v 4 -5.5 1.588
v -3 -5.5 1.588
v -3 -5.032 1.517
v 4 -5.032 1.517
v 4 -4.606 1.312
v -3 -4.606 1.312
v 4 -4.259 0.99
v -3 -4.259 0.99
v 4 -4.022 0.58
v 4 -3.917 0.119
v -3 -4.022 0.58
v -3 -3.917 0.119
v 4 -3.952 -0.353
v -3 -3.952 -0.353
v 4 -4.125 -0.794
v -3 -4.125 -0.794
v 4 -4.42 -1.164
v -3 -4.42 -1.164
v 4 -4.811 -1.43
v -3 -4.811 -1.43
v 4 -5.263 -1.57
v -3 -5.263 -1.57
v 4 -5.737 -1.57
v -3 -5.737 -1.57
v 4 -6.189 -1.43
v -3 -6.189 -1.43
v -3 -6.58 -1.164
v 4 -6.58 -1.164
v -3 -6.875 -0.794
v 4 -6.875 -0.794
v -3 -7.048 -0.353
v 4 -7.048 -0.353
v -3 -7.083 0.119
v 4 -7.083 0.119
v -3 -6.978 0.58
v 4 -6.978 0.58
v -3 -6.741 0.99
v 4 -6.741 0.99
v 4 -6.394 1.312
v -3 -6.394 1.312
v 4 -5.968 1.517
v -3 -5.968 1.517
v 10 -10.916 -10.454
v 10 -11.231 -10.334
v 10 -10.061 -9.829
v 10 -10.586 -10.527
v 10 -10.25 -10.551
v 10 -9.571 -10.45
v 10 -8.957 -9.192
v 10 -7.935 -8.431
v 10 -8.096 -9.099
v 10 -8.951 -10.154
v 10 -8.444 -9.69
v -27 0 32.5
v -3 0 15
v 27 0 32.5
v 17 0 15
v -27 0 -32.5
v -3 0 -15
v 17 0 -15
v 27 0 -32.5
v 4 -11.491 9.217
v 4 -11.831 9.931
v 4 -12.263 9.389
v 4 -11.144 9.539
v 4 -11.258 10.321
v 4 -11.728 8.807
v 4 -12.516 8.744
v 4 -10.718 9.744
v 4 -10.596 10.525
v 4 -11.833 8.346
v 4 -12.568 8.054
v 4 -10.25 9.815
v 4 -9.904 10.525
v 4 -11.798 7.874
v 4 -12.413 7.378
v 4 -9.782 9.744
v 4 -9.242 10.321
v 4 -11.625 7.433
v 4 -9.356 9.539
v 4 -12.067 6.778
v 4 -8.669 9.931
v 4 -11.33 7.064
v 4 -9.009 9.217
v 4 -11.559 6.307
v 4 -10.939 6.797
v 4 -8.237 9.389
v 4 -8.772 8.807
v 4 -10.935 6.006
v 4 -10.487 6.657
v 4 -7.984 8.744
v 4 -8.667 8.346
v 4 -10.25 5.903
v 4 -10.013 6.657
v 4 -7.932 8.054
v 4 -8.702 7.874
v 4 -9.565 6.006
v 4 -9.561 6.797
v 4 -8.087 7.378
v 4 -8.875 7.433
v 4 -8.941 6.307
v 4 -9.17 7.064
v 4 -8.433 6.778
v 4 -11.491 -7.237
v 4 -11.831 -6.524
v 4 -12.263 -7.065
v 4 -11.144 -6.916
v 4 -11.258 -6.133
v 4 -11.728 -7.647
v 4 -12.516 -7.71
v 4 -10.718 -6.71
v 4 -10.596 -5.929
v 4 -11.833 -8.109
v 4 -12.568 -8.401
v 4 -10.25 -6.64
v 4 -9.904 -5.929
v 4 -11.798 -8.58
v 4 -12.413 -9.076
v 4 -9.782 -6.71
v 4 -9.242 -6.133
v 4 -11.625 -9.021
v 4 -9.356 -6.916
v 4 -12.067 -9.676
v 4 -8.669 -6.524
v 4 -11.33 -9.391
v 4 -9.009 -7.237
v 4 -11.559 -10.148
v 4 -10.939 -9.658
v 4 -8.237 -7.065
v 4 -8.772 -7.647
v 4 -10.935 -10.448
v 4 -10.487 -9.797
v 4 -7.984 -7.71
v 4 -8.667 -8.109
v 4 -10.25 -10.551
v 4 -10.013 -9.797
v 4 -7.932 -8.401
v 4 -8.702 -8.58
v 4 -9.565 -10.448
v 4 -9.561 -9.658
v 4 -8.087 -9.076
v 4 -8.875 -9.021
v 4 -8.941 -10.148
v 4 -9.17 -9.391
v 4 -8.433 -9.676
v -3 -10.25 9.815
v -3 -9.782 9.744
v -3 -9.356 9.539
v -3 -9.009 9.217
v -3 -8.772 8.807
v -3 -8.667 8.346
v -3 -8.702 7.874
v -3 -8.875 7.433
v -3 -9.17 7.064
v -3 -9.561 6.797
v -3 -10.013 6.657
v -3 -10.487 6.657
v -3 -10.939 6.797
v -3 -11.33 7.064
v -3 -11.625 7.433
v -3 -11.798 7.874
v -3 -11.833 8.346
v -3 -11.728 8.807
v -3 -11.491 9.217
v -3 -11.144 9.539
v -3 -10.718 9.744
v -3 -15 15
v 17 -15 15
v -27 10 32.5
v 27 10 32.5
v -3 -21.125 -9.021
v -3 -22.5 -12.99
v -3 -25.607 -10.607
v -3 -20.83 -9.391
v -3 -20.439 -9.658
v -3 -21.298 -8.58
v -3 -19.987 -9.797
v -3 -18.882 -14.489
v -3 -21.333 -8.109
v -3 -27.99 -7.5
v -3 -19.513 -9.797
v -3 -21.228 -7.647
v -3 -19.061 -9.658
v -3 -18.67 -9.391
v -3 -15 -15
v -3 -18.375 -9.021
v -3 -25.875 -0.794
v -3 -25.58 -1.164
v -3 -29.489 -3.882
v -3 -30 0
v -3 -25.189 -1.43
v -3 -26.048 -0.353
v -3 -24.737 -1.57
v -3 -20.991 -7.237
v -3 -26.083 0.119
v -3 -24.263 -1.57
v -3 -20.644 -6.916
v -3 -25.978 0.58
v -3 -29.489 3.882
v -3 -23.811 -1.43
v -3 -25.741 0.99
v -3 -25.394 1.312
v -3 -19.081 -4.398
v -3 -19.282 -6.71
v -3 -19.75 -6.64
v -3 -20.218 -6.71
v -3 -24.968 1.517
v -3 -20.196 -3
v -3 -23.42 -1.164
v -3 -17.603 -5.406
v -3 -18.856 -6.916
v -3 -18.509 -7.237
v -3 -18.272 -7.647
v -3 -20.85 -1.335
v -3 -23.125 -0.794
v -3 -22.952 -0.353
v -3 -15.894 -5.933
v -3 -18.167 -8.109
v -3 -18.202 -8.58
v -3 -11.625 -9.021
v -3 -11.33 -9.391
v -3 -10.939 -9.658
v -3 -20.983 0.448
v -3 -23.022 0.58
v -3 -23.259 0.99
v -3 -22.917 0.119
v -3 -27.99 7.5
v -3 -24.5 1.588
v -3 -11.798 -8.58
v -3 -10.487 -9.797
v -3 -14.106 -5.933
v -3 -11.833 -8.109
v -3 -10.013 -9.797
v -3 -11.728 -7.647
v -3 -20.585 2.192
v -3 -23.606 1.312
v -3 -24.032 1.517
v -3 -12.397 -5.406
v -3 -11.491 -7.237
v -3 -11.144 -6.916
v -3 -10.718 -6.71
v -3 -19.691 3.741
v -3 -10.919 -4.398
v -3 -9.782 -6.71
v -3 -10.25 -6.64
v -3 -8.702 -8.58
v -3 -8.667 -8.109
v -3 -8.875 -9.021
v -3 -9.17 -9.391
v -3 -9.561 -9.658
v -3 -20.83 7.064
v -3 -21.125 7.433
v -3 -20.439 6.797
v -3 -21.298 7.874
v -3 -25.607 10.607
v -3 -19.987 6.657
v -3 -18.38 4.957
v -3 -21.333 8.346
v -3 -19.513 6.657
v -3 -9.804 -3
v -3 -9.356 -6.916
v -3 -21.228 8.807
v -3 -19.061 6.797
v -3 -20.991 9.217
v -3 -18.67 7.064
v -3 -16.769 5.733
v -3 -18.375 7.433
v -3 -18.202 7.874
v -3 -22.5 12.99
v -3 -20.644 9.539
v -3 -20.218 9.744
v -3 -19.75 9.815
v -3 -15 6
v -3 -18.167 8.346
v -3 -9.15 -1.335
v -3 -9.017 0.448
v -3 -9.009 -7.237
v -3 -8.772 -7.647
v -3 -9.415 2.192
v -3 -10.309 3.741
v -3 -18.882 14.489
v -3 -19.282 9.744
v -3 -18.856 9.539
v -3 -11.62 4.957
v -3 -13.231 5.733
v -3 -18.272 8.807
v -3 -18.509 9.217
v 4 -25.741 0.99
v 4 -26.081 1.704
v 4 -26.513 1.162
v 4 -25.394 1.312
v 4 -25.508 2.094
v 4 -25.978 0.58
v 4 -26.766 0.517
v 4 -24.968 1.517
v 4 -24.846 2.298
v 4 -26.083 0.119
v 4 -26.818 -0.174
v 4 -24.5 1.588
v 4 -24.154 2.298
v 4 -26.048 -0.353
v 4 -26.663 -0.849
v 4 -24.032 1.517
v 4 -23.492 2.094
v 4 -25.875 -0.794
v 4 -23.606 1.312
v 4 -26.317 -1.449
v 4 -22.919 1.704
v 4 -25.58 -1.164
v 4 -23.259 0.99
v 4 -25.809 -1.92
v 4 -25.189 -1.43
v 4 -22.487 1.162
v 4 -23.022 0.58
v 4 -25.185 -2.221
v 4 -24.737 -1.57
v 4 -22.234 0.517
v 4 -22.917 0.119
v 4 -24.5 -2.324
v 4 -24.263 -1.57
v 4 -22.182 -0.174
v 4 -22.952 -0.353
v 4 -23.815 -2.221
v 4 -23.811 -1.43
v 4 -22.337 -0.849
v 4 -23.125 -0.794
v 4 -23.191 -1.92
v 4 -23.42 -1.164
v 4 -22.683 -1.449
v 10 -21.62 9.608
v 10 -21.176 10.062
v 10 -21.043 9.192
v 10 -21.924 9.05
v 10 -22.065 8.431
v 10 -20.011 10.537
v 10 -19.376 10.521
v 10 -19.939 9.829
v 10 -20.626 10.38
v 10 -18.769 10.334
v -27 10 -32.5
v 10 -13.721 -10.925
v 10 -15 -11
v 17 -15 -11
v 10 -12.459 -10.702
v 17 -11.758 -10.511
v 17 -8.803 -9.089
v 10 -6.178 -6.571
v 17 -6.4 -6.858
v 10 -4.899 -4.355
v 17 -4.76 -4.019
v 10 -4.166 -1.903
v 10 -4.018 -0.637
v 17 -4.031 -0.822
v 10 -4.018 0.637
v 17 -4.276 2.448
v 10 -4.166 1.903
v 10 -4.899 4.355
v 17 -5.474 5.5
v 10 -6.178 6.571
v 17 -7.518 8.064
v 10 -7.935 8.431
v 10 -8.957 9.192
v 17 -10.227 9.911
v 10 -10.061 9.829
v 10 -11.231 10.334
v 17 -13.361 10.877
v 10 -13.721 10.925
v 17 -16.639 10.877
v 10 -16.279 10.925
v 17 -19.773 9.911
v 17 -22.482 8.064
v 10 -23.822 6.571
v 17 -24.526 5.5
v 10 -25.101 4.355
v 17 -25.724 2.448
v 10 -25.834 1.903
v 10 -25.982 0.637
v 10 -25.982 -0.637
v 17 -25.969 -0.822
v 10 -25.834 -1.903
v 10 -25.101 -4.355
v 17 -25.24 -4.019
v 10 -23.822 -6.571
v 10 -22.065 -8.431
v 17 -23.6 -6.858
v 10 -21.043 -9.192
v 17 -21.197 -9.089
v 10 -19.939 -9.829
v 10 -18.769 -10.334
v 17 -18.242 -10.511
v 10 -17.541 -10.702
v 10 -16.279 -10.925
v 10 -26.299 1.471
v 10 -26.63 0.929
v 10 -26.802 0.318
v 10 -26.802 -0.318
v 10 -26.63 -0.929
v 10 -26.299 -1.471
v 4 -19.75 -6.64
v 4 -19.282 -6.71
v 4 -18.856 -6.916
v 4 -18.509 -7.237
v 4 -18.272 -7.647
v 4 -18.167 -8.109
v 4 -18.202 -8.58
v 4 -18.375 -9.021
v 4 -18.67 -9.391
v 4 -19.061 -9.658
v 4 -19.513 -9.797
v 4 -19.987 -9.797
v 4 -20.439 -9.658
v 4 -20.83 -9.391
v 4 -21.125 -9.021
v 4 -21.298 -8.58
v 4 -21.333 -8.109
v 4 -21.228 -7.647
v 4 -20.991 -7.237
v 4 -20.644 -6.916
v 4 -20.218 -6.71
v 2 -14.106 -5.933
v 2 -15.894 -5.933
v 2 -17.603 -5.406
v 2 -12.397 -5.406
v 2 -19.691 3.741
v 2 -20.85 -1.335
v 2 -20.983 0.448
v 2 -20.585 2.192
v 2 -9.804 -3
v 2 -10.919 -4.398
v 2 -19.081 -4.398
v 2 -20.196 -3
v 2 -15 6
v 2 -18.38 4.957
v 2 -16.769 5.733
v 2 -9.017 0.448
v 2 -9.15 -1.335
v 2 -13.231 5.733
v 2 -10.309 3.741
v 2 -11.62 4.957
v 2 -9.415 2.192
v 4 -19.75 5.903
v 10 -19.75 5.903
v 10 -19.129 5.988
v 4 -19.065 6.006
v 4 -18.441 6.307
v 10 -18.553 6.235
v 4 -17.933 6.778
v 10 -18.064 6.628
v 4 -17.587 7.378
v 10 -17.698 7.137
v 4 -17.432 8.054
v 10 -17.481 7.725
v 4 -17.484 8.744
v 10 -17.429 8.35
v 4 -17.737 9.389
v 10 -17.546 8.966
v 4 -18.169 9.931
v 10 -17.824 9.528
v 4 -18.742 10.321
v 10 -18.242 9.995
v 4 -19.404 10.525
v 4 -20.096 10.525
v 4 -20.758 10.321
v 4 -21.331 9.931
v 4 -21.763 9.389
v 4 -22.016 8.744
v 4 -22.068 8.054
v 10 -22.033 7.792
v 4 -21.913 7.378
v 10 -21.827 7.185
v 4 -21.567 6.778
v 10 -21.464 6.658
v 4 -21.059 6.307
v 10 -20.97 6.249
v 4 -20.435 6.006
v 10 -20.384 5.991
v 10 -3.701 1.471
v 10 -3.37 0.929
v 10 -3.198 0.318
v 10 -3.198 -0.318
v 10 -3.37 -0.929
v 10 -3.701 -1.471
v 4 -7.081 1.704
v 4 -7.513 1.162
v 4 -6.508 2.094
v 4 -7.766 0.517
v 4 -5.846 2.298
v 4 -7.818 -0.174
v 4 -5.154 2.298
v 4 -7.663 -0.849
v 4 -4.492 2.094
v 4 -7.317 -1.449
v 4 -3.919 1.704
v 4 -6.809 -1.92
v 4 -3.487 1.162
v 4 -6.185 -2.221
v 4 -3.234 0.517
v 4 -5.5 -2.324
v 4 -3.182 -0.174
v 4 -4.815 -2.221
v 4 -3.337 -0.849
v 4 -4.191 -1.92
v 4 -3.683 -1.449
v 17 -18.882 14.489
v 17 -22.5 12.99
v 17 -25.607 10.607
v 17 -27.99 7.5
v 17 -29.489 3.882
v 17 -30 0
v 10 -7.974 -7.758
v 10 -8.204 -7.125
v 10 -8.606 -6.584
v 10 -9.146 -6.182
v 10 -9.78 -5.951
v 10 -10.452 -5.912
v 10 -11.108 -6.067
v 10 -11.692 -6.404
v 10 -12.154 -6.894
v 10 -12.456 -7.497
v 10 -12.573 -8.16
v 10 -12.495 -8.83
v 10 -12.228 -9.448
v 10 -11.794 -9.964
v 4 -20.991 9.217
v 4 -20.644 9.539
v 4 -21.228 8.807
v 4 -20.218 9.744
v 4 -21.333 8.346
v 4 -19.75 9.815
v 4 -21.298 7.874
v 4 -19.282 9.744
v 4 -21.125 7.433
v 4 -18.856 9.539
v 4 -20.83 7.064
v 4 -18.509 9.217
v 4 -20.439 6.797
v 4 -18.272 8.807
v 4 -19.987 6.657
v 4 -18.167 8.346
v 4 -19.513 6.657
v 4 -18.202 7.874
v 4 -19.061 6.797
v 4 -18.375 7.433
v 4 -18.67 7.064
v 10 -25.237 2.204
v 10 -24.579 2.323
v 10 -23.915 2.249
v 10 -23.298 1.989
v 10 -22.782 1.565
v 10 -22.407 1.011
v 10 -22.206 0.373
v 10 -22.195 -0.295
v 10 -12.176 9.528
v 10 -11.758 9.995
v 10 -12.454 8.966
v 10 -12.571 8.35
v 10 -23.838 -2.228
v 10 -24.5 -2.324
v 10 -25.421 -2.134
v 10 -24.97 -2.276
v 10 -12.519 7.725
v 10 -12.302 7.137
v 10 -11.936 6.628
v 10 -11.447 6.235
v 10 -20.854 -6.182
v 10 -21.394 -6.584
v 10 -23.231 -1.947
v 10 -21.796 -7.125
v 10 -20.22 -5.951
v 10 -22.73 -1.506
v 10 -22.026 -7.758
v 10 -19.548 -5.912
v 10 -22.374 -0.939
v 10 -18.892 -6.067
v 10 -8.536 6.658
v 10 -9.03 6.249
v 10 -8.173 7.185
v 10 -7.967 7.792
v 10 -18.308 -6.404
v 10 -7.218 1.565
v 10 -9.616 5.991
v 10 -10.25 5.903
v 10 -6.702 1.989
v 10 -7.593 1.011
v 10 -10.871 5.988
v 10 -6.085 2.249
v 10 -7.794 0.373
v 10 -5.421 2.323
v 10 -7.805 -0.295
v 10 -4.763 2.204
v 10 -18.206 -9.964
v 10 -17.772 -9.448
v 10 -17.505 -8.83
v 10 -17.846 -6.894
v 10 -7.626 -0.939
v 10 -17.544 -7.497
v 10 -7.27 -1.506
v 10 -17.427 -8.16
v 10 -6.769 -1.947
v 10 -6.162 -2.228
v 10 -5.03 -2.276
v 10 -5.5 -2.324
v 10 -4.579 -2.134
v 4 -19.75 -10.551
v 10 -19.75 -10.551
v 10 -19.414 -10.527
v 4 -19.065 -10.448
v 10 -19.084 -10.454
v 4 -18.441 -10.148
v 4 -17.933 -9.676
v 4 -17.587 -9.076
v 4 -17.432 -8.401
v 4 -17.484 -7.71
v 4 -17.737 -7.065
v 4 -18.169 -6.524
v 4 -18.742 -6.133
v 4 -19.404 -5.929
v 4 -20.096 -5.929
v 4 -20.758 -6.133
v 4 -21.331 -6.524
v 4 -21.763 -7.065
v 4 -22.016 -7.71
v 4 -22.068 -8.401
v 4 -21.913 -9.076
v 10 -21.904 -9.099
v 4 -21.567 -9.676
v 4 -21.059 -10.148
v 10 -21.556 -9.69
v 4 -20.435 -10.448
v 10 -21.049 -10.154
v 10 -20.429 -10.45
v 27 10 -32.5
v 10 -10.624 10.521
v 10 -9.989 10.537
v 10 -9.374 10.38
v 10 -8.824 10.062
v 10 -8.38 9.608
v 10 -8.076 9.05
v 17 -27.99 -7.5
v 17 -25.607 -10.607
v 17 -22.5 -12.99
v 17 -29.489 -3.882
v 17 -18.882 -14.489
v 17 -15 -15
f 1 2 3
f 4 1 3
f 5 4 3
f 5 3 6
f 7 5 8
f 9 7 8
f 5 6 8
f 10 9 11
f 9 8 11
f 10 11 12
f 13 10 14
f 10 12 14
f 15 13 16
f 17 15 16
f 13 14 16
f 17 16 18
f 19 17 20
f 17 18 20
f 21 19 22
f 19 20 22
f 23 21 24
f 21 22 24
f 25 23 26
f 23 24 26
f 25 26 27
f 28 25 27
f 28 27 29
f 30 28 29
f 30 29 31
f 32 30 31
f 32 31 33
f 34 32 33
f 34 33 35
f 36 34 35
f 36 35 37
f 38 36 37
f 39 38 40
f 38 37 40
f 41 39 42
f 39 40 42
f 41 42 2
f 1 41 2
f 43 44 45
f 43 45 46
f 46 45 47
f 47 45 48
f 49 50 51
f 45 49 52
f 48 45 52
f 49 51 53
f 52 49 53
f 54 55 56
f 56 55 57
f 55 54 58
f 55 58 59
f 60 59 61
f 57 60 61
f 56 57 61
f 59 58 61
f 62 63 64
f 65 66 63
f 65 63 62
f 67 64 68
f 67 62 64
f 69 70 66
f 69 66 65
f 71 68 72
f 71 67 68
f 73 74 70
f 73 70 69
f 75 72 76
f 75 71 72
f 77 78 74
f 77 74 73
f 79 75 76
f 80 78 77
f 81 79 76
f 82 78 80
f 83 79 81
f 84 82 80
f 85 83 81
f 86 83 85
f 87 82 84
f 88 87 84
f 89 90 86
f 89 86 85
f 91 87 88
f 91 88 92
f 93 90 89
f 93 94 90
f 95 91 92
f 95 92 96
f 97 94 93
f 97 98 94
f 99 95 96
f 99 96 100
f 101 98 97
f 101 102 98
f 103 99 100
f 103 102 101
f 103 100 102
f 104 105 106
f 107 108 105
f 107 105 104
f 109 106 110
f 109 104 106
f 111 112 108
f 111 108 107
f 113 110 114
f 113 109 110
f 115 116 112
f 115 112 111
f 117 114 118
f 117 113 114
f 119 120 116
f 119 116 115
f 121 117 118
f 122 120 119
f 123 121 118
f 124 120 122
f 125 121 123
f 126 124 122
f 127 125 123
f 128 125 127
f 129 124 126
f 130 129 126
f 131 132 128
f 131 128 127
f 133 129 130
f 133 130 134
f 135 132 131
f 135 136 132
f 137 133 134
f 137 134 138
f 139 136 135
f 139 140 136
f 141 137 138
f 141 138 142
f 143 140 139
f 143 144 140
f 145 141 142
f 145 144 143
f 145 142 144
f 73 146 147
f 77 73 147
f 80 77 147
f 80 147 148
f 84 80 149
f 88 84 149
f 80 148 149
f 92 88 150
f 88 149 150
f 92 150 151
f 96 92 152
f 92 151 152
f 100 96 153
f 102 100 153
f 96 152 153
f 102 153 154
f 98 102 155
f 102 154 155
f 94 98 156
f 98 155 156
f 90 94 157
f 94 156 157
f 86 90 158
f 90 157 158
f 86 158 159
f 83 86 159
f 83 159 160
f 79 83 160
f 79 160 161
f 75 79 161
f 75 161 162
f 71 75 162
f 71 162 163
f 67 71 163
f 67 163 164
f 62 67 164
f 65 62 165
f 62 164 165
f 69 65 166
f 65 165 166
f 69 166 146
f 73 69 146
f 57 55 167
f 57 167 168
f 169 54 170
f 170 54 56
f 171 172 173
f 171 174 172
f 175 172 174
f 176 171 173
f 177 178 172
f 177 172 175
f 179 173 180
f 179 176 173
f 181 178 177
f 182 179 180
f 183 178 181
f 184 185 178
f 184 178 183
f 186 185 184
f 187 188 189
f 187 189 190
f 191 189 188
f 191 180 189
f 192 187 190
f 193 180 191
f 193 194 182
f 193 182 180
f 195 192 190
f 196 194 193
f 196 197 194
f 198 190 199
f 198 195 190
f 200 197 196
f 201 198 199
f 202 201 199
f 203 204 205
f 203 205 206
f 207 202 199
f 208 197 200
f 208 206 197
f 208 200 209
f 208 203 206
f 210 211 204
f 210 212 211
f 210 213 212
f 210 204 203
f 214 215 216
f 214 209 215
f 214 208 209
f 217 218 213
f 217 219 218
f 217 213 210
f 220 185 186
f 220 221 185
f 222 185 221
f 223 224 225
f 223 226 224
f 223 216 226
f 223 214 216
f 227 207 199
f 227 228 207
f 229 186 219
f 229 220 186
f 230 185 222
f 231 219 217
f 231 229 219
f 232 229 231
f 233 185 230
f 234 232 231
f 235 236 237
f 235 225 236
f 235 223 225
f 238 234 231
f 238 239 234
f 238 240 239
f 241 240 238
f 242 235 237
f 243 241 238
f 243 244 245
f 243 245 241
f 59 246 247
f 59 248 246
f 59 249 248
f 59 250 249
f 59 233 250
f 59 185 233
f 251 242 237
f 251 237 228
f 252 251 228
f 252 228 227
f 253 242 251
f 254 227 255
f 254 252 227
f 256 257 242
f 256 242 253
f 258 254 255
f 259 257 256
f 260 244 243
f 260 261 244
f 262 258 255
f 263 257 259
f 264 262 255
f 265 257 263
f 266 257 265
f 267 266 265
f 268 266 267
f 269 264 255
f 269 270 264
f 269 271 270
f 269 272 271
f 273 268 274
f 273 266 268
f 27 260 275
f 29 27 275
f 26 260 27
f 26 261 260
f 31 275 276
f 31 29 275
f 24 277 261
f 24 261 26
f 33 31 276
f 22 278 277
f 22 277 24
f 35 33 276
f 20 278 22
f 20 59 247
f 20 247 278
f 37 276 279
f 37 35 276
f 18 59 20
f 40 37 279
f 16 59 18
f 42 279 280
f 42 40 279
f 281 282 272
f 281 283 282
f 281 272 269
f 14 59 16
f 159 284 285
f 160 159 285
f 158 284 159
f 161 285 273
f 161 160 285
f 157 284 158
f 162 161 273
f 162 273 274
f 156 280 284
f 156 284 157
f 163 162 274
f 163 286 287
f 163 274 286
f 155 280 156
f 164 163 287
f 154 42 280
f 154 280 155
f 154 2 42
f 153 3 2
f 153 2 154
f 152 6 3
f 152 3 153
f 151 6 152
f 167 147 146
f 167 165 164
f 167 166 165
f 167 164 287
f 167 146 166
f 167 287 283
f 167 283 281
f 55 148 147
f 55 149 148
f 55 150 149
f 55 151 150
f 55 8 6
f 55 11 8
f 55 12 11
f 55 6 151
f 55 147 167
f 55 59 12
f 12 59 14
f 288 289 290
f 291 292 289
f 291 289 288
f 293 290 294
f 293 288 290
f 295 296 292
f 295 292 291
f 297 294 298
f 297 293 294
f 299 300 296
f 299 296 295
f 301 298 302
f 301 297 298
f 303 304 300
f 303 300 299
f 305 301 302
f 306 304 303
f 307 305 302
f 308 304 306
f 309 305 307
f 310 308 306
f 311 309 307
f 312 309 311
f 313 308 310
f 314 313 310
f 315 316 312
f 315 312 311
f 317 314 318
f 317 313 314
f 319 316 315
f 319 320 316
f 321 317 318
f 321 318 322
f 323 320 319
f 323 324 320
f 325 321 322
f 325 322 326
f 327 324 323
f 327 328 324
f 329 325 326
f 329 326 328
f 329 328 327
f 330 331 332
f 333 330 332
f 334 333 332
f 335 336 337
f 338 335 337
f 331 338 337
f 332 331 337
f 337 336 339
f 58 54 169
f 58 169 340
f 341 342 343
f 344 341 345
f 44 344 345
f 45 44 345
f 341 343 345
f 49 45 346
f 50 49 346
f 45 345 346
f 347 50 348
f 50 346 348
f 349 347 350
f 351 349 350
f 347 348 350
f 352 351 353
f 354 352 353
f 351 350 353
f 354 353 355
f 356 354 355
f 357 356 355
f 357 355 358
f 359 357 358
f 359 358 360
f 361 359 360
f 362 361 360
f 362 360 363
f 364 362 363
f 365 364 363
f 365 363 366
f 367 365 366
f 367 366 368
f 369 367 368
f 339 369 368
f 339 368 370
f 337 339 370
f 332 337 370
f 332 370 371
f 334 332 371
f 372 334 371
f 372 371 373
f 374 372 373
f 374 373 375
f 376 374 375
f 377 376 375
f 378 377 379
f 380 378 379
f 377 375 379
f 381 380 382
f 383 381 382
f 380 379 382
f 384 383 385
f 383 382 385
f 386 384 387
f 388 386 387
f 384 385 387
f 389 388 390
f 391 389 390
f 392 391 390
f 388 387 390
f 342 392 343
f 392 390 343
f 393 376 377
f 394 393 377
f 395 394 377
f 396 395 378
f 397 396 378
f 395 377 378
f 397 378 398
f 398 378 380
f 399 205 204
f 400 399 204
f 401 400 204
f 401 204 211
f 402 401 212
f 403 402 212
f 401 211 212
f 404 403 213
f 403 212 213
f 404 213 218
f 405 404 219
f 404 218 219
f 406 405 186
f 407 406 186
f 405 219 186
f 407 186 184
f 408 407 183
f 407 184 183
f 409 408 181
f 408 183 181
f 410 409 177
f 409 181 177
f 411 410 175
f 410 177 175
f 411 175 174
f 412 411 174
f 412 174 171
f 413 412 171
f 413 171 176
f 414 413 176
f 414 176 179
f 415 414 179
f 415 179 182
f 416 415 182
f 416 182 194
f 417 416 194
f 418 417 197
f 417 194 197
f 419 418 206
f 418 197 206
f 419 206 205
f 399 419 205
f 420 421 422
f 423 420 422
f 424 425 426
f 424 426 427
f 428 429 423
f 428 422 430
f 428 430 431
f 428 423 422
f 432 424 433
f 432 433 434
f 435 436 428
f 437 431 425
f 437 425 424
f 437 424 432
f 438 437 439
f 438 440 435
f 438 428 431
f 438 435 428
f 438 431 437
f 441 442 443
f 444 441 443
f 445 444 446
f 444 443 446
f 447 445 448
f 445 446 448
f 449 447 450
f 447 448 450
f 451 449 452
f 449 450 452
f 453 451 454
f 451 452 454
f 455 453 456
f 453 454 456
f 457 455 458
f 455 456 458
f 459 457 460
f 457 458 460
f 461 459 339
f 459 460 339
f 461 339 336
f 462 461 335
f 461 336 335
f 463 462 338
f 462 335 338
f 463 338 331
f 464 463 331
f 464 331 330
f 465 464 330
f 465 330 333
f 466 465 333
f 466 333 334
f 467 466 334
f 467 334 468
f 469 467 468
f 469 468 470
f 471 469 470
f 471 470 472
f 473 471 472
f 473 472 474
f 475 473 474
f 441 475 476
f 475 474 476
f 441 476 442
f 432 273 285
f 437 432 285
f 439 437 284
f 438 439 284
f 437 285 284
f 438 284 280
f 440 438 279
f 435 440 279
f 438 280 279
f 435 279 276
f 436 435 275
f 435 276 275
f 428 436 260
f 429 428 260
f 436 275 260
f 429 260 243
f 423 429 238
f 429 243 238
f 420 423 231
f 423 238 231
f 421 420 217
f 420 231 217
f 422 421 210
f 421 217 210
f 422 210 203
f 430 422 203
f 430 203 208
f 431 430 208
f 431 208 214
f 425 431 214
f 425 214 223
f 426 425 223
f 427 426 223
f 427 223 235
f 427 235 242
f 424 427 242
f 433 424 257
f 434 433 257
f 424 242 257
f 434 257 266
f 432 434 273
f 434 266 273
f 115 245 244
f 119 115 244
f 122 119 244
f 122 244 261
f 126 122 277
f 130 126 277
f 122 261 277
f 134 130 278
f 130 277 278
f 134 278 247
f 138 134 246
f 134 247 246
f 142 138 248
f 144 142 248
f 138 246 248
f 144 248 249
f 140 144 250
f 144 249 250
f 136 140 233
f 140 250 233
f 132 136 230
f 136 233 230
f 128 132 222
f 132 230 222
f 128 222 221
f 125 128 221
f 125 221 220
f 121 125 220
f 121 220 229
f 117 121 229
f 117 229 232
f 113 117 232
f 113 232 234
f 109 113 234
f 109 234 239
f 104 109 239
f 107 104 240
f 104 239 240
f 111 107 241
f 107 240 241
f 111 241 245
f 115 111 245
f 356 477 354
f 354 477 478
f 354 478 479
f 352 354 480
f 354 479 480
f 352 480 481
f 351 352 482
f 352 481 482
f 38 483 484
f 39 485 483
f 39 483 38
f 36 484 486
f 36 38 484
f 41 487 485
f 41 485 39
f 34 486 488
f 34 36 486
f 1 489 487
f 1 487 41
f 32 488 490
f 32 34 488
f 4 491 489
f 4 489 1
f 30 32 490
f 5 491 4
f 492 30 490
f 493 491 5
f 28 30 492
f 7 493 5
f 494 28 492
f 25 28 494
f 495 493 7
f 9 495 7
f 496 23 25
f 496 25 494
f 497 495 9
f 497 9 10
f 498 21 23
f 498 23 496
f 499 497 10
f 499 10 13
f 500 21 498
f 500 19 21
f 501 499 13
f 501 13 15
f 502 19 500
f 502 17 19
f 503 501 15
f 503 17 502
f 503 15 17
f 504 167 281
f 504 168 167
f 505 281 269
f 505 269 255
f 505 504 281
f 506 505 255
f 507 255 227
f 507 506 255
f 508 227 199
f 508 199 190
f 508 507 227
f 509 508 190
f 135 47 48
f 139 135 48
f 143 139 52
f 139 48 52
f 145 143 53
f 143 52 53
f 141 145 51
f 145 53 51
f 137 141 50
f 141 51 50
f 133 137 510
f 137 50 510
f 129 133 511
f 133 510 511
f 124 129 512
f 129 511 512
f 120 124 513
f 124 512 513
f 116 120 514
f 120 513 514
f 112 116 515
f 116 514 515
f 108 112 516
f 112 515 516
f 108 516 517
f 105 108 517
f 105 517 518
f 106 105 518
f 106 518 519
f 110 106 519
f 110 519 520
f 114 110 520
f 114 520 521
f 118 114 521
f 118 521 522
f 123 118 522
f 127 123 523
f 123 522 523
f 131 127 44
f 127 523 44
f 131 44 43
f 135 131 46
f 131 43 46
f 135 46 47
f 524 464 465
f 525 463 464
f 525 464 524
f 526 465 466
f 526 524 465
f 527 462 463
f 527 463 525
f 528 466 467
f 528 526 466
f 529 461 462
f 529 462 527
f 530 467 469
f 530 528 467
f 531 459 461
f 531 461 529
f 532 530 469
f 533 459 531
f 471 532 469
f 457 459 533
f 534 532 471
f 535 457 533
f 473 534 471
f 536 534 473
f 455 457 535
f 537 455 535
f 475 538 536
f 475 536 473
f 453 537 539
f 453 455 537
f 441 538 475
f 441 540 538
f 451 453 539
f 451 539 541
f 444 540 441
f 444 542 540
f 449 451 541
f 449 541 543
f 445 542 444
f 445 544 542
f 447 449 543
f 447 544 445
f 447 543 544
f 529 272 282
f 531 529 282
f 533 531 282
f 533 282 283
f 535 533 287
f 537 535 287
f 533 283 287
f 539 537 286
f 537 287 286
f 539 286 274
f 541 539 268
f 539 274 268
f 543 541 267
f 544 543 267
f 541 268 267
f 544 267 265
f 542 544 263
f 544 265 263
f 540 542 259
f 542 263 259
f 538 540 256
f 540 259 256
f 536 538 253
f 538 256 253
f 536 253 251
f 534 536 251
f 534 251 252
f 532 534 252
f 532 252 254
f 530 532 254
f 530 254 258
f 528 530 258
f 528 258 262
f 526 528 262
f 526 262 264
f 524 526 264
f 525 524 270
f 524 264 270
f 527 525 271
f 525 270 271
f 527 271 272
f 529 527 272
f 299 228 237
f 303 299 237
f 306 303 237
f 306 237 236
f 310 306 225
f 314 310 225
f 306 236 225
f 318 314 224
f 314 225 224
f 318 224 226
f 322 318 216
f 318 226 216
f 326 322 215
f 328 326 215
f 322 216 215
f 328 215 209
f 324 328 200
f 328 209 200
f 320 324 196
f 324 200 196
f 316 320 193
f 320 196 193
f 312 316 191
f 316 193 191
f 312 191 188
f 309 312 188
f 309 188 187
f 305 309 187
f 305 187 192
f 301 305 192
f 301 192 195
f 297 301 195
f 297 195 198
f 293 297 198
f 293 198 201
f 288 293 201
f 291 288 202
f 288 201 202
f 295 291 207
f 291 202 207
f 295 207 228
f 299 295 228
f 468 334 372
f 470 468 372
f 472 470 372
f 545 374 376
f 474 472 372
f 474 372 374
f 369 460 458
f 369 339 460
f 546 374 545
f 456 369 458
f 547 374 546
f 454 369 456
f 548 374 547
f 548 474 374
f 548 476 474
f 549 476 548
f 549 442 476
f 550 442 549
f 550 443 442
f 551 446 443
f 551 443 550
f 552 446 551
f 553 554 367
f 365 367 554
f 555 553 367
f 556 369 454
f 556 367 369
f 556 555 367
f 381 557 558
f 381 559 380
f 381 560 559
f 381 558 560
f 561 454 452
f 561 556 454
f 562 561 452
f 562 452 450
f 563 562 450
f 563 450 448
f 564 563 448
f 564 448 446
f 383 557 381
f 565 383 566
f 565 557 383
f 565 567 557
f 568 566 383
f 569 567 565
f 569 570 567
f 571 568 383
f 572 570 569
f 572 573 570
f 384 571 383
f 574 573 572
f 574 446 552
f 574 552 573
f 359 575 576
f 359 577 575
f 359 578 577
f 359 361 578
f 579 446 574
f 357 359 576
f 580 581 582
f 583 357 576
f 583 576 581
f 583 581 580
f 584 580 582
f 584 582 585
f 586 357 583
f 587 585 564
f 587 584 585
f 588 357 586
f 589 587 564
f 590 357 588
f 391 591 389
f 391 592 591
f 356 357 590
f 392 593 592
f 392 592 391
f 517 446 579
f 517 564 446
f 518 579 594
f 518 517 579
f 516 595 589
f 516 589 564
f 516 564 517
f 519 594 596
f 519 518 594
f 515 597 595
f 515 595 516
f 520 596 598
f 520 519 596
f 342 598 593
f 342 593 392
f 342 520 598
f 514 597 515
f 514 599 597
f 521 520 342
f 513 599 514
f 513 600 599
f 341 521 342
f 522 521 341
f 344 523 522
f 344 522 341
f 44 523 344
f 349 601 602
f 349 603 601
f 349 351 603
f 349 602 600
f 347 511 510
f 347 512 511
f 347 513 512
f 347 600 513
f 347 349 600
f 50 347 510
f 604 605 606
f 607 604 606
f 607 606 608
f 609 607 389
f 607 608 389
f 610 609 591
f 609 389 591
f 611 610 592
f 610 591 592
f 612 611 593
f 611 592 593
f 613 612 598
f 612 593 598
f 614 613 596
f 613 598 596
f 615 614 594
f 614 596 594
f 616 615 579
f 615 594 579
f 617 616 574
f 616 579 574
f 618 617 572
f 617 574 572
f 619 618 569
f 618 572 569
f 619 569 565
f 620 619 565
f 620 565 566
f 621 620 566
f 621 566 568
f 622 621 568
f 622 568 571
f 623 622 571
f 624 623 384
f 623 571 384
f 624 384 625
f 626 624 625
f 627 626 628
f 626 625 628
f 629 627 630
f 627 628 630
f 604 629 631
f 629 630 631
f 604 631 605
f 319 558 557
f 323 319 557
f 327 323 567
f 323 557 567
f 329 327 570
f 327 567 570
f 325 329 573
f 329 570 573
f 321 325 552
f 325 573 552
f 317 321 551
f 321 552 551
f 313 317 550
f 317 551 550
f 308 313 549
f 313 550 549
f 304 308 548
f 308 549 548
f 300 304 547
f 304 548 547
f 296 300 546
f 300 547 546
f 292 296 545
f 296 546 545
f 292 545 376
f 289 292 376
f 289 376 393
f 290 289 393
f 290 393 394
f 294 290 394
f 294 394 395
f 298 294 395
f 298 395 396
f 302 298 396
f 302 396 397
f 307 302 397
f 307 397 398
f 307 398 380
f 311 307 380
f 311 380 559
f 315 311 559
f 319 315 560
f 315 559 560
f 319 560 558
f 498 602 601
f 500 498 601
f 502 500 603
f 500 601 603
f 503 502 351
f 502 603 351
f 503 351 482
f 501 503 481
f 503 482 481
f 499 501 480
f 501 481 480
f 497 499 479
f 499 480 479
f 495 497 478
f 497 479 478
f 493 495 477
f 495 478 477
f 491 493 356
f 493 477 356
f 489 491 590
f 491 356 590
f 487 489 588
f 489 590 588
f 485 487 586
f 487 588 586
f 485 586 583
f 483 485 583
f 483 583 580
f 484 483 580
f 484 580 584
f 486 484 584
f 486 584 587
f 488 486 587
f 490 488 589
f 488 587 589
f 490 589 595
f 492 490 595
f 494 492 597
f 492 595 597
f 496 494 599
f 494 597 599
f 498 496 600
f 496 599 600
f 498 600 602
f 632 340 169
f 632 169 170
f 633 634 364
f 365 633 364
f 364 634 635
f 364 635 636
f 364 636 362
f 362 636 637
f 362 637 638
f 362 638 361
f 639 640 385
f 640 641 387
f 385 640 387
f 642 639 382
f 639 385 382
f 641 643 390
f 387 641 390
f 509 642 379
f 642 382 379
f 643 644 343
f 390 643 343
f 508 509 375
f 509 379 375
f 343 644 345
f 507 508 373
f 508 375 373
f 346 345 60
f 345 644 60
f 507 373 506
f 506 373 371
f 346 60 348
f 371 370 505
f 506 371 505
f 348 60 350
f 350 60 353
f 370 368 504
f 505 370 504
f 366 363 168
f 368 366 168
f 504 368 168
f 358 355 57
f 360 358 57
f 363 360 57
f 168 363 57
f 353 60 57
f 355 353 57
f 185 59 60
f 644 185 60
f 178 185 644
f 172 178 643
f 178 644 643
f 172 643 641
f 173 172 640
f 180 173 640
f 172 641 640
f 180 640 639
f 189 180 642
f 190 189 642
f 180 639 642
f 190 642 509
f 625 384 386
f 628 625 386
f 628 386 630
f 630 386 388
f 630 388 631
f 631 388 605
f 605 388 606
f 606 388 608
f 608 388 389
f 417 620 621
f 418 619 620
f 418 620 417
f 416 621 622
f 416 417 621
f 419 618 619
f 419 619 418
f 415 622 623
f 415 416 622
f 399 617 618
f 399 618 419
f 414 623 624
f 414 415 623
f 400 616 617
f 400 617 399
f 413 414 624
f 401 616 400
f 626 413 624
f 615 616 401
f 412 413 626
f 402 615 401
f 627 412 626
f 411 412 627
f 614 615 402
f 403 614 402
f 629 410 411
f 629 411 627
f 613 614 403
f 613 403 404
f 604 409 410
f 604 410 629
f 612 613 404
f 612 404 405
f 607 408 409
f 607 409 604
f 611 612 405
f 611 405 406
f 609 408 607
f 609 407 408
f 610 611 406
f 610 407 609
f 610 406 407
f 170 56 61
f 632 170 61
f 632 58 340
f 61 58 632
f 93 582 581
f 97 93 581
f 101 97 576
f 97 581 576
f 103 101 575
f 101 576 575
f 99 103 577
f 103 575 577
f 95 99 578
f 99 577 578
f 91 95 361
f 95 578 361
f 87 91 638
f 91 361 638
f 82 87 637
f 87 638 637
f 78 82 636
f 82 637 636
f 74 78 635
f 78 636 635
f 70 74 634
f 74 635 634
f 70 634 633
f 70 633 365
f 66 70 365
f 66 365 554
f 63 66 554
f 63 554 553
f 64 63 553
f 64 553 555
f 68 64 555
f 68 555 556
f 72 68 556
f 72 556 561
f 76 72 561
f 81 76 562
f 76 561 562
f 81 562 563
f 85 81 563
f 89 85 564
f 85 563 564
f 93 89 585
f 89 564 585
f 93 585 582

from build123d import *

# Parameters (mm, degrees)
SKETCH1_W           = 54
SKETCH1_H           = 65
BOSS_EXTRUDE1_DEPTH = 10
SKETCH2_W           = 20
SKETCH2_H           = 30
BOSS_EXTRUDE2_DEPTH = 30
FILLET1_R           = 15
SKETCH3_R           = 11
CUT_EXTRUDE1_DEPTH  = 7
SKETCH4_R           = 6
CUT_EXTRUDE2_DEPTH  = 5
SKETCH5_R           = 1.5875
CUT_EXTRUDE3_DEPTH  = 7
SKETCH6_R           = 2.3241
CUT_EXTRUDE4_DEPTH  = 6


with BuildPart() as part:
    # Sketch1 → Boss-Extrude1 (new body)
    with BuildSketch(Plane(origin=(0, 0, 0), x_dir=(1, 0, 0), z_dir=(0, 1, 0))):
        Rectangle(SKETCH1_W, SKETCH1_H)
    extrude(amount=BOSS_EXTRUDE1_DEPTH)

    # Sketch2 → Boss-Extrude2 (add)
    with BuildSketch(Plane.XZ):
        with Locations((7, 0)):
            Rectangle(SKETCH2_W, SKETCH2_H)
    extrude(amount=BOSS_EXTRUDE2_DEPTH)

    # Fillet1
    fillet1_edges = [part.edges().sort_by_distance(p)[0] for p in [
        (7, -30, -15),
        (7, -30, 15),
    ]]
    fillet(fillet1_edges, radius=FILLET1_R - 0.0001)  # a hair under: the kernel refuses the full size

    # Sketch3 → Cut-Extrude1 (cut)
    with BuildSketch(Plane(origin=(17, 0, 0), x_dir=(0, 0, -1), z_dir=(1, 0, 0))):
        with Locations((0, -15)):
            Circle(SKETCH3_R)
    extrude(amount=-CUT_EXTRUDE1_DEPTH, mode=Mode.SUBTRACT)

    # Sketch4 → Cut-Extrude2 (cut)
    with BuildSketch(Plane.ZY.offset(3)):
        with Locations((0, -15)):
            Circle(SKETCH4_R)
    extrude(amount=-CUT_EXTRUDE2_DEPTH, mode=Mode.SUBTRACT)

    # Sketch5 → Cut-Extrude3 (cut)
    with BuildSketch(Plane.ZY.offset(3)):
        with Locations((0, -5.5)):
            Circle(SKETCH5_R)
        with Locations((8.227241336, -10.25)):
            Circle(SKETCH5_R)
        with Locations((8.227241336, -19.75)):
            Circle(SKETCH5_R)
        with Locations((0, -24.5)):
            Circle(SKETCH5_R)
        with Locations((-8.227241336, -19.75)):
            Circle(SKETCH5_R)
        with Locations((-8.227241336, -10.25)):
            Circle(SKETCH5_R)
    extrude(amount=-CUT_EXTRUDE3_DEPTH, mode=Mode.SUBTRACT)

    # Sketch6 → Cut-Extrude4 (cut)
    with BuildSketch(Plane(origin=(10, 0, 0), x_dir=(0, 0, -1), z_dir=(1, 0, 0))):
        with Locations((0, -5.5)):
            Circle(SKETCH6_R)
        with Locations((8.227241336, -10.25)):
            Circle(SKETCH6_R)
        with Locations((8.227241336, -19.75)):
            Circle(SKETCH6_R)
        with Locations((0, -24.5)):
            Circle(SKETCH6_R)
        with Locations((-8.227241336, -19.75)):
            Circle(SKETCH6_R)
        with Locations((-8.227241336, -10.25)):
            Circle(SKETCH6_R)
    extrude(amount=-CUT_EXTRUDE4_DEPTH, mode=Mode.SUBTRACT)


solid = part.part
